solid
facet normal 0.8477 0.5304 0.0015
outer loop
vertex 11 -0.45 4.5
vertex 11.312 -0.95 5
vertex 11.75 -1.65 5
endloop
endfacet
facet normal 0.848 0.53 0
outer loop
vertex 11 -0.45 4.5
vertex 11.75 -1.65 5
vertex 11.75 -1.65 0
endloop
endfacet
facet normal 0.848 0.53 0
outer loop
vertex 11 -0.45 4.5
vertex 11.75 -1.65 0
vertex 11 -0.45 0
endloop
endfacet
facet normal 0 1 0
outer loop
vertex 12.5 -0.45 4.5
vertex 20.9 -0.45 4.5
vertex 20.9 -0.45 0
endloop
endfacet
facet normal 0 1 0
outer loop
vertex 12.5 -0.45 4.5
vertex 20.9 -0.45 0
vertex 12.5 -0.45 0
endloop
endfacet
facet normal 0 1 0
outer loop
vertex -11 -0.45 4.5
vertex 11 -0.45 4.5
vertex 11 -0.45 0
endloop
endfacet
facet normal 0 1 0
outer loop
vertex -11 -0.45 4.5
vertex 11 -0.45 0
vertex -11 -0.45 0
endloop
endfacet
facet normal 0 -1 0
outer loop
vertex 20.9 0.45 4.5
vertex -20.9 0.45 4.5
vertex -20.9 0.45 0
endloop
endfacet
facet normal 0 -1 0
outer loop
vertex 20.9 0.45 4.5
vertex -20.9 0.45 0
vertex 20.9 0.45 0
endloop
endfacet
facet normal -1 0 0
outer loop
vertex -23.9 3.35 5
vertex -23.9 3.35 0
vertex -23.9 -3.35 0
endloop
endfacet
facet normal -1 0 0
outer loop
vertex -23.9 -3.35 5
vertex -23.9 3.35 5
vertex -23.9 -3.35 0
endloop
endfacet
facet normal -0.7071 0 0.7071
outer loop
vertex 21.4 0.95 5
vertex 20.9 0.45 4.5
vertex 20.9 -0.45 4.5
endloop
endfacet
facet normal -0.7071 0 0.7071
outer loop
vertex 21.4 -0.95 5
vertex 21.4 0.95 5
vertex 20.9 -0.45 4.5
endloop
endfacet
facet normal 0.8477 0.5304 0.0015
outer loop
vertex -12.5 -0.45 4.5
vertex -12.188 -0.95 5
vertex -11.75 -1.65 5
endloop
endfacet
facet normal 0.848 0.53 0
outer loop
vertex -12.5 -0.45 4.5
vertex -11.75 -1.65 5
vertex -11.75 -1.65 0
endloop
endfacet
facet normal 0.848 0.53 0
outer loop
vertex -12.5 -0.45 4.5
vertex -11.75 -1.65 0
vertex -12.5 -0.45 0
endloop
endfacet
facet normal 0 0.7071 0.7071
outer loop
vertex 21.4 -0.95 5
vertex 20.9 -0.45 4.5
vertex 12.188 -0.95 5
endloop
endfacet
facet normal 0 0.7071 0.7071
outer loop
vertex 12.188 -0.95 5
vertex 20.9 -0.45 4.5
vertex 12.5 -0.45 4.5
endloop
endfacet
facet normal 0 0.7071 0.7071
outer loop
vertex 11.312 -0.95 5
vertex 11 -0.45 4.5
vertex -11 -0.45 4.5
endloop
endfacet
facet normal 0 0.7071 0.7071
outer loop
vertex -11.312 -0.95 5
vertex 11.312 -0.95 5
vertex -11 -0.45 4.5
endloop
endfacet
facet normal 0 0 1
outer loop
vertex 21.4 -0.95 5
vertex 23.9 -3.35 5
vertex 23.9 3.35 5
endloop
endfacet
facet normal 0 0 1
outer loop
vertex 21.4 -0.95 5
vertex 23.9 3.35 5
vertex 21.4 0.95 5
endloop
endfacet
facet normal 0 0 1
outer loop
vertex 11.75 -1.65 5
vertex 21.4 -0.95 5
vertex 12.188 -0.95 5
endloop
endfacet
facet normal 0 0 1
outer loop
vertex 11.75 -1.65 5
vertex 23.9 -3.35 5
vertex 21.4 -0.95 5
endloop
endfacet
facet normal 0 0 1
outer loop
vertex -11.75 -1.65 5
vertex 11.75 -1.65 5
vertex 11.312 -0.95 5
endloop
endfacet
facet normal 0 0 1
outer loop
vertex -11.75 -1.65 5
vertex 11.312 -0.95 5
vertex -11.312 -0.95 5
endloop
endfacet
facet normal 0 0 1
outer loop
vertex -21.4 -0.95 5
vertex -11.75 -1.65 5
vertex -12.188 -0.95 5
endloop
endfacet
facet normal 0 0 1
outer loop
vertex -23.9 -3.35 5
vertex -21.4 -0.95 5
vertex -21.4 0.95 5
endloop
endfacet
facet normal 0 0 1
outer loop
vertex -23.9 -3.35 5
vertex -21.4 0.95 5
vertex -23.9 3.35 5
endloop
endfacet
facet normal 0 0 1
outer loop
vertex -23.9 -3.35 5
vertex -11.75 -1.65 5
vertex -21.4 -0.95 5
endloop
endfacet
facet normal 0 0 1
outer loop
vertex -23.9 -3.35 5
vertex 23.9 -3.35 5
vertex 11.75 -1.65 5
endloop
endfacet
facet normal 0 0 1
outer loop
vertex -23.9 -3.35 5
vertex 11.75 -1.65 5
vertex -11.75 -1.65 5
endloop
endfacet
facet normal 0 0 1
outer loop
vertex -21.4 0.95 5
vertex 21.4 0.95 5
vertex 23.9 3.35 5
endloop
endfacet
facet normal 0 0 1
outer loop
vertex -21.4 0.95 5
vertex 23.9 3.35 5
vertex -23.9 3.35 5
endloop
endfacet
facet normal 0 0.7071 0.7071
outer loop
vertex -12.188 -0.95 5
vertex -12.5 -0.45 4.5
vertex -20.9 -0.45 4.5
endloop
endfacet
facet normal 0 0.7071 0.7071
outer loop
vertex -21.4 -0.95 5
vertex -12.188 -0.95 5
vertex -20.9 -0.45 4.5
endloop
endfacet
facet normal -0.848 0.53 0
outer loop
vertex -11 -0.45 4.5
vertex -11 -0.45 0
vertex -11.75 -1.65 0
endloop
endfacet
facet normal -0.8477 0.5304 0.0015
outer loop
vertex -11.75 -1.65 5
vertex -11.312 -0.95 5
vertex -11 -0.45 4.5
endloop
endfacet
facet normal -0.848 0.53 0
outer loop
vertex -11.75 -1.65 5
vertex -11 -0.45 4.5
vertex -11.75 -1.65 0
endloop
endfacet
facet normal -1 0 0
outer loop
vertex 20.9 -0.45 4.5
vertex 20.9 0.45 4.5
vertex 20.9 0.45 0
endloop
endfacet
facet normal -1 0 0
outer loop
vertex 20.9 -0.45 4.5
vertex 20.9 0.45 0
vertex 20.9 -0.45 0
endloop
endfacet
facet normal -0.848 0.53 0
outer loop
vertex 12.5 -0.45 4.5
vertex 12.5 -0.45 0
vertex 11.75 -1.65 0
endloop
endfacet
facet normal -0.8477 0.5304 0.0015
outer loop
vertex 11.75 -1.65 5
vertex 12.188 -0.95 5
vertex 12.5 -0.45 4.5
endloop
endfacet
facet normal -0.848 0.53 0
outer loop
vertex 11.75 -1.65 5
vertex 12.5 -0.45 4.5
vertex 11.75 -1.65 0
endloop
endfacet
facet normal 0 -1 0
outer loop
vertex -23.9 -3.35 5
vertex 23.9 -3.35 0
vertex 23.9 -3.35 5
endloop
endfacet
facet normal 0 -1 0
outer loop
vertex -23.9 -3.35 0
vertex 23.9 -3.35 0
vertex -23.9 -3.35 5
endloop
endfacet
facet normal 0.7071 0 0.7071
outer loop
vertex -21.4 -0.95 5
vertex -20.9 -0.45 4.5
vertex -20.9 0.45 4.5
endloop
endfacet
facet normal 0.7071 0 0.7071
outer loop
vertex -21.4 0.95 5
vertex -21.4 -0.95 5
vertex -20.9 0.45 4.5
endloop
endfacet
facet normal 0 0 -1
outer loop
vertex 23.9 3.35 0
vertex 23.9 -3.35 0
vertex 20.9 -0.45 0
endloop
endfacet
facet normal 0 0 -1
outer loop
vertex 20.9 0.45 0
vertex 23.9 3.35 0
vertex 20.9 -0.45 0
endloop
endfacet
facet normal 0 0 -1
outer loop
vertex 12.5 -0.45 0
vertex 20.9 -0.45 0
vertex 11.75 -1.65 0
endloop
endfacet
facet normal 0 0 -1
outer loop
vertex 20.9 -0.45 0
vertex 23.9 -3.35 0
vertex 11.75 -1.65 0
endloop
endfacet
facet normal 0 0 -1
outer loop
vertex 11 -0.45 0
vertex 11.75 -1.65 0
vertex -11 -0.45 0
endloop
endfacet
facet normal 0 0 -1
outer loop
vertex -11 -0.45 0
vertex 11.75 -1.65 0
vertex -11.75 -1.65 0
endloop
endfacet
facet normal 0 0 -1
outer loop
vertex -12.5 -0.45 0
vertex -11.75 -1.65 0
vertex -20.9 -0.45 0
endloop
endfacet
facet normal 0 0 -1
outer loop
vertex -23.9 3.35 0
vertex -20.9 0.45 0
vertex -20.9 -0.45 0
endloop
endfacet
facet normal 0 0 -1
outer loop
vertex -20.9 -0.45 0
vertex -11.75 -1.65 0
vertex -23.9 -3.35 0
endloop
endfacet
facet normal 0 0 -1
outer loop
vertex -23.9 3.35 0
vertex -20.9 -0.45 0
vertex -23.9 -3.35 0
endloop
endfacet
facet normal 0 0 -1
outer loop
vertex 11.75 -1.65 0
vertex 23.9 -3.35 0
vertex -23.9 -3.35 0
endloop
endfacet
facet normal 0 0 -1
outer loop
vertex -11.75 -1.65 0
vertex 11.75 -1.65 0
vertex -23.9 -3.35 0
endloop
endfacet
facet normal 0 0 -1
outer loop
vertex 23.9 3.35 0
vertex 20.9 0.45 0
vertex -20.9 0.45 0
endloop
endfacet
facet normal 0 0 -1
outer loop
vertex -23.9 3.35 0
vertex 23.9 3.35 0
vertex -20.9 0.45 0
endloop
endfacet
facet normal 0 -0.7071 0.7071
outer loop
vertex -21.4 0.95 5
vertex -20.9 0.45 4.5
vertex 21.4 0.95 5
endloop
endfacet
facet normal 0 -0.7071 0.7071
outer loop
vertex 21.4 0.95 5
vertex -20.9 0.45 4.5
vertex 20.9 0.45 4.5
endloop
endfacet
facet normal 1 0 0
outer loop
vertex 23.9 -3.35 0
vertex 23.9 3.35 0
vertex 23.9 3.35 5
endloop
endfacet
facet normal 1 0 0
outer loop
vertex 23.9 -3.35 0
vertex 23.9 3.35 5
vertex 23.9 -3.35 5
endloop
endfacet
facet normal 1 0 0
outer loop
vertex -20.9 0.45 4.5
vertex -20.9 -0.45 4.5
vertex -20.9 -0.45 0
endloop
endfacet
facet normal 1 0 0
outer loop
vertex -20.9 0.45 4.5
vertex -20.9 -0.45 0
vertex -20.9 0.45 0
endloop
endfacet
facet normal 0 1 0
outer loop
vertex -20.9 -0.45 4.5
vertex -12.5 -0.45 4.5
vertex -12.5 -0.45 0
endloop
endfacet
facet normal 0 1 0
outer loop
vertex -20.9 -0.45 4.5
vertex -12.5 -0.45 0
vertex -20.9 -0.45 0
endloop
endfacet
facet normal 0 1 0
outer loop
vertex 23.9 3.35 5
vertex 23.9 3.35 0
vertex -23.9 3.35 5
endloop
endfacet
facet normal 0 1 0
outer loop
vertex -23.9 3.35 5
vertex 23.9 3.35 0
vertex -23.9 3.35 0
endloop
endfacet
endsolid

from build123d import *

# Parameters (mm, degrees)
SKETCH_1_W          = 47.8
SKETCH_1_H          = 6.7
EXTRUDE_1_DEPTH     = 5
CUT_EXTRUDE_1_DEPTH = 7.5
CHAMFER_1_SIZE      = 0.5


with BuildPart() as part:
    # Эскиз1 → Бобышка-Вытянуть1 (new body)
    with BuildSketch(Plane(origin=(0, 66.754264805, 0), x_dir=(-1, 0, 0), z_dir=(0, 0, 1))):
        with Locations((0, 66.754264805)):
            Rectangle(SKETCH_1_W, SKETCH_1_H)
    extrude(amount=EXTRUDE_1_DEPTH)

    # Эскиз6 → Вырез-Вытянуть1 (cut)
    with BuildSketch(Plane(origin=(0, 66.754264805, 5), x_dir=(-1, 0, 0), z_dir=(0, 0, 1))):
        Polygon((-20.9, 67.204264805), (-12.5, 67.204264805), (-11.75, 68.404264805), (-11, 67.204264805), (11, 67.204264805), (11.75, 68.404264805), (12.5, 67.204264805), (20.9, 67.204264805), (20.9, 66.304264805), (-20.9, 66.304264805), align=None)
    extrude(amount=-CUT_EXTRUDE_1_DEPTH, mode=Mode.SUBTRACT)

    # Фаска1
    chamfer_1_edges = [part.edges().sort_by_distance(p)[0] for p in [
        (16.7, -0.45, 5),
        (20.9, 0, 5),
        (0, 0.45, 5),
        (-20.9, 0, 5),
        (-16.7, -0.45, 5),
        (0, -0.45, 5),
    ]]
    chamfer(chamfer_1_edges, length=CHAMFER_1_SIZE)


solid = part.part
